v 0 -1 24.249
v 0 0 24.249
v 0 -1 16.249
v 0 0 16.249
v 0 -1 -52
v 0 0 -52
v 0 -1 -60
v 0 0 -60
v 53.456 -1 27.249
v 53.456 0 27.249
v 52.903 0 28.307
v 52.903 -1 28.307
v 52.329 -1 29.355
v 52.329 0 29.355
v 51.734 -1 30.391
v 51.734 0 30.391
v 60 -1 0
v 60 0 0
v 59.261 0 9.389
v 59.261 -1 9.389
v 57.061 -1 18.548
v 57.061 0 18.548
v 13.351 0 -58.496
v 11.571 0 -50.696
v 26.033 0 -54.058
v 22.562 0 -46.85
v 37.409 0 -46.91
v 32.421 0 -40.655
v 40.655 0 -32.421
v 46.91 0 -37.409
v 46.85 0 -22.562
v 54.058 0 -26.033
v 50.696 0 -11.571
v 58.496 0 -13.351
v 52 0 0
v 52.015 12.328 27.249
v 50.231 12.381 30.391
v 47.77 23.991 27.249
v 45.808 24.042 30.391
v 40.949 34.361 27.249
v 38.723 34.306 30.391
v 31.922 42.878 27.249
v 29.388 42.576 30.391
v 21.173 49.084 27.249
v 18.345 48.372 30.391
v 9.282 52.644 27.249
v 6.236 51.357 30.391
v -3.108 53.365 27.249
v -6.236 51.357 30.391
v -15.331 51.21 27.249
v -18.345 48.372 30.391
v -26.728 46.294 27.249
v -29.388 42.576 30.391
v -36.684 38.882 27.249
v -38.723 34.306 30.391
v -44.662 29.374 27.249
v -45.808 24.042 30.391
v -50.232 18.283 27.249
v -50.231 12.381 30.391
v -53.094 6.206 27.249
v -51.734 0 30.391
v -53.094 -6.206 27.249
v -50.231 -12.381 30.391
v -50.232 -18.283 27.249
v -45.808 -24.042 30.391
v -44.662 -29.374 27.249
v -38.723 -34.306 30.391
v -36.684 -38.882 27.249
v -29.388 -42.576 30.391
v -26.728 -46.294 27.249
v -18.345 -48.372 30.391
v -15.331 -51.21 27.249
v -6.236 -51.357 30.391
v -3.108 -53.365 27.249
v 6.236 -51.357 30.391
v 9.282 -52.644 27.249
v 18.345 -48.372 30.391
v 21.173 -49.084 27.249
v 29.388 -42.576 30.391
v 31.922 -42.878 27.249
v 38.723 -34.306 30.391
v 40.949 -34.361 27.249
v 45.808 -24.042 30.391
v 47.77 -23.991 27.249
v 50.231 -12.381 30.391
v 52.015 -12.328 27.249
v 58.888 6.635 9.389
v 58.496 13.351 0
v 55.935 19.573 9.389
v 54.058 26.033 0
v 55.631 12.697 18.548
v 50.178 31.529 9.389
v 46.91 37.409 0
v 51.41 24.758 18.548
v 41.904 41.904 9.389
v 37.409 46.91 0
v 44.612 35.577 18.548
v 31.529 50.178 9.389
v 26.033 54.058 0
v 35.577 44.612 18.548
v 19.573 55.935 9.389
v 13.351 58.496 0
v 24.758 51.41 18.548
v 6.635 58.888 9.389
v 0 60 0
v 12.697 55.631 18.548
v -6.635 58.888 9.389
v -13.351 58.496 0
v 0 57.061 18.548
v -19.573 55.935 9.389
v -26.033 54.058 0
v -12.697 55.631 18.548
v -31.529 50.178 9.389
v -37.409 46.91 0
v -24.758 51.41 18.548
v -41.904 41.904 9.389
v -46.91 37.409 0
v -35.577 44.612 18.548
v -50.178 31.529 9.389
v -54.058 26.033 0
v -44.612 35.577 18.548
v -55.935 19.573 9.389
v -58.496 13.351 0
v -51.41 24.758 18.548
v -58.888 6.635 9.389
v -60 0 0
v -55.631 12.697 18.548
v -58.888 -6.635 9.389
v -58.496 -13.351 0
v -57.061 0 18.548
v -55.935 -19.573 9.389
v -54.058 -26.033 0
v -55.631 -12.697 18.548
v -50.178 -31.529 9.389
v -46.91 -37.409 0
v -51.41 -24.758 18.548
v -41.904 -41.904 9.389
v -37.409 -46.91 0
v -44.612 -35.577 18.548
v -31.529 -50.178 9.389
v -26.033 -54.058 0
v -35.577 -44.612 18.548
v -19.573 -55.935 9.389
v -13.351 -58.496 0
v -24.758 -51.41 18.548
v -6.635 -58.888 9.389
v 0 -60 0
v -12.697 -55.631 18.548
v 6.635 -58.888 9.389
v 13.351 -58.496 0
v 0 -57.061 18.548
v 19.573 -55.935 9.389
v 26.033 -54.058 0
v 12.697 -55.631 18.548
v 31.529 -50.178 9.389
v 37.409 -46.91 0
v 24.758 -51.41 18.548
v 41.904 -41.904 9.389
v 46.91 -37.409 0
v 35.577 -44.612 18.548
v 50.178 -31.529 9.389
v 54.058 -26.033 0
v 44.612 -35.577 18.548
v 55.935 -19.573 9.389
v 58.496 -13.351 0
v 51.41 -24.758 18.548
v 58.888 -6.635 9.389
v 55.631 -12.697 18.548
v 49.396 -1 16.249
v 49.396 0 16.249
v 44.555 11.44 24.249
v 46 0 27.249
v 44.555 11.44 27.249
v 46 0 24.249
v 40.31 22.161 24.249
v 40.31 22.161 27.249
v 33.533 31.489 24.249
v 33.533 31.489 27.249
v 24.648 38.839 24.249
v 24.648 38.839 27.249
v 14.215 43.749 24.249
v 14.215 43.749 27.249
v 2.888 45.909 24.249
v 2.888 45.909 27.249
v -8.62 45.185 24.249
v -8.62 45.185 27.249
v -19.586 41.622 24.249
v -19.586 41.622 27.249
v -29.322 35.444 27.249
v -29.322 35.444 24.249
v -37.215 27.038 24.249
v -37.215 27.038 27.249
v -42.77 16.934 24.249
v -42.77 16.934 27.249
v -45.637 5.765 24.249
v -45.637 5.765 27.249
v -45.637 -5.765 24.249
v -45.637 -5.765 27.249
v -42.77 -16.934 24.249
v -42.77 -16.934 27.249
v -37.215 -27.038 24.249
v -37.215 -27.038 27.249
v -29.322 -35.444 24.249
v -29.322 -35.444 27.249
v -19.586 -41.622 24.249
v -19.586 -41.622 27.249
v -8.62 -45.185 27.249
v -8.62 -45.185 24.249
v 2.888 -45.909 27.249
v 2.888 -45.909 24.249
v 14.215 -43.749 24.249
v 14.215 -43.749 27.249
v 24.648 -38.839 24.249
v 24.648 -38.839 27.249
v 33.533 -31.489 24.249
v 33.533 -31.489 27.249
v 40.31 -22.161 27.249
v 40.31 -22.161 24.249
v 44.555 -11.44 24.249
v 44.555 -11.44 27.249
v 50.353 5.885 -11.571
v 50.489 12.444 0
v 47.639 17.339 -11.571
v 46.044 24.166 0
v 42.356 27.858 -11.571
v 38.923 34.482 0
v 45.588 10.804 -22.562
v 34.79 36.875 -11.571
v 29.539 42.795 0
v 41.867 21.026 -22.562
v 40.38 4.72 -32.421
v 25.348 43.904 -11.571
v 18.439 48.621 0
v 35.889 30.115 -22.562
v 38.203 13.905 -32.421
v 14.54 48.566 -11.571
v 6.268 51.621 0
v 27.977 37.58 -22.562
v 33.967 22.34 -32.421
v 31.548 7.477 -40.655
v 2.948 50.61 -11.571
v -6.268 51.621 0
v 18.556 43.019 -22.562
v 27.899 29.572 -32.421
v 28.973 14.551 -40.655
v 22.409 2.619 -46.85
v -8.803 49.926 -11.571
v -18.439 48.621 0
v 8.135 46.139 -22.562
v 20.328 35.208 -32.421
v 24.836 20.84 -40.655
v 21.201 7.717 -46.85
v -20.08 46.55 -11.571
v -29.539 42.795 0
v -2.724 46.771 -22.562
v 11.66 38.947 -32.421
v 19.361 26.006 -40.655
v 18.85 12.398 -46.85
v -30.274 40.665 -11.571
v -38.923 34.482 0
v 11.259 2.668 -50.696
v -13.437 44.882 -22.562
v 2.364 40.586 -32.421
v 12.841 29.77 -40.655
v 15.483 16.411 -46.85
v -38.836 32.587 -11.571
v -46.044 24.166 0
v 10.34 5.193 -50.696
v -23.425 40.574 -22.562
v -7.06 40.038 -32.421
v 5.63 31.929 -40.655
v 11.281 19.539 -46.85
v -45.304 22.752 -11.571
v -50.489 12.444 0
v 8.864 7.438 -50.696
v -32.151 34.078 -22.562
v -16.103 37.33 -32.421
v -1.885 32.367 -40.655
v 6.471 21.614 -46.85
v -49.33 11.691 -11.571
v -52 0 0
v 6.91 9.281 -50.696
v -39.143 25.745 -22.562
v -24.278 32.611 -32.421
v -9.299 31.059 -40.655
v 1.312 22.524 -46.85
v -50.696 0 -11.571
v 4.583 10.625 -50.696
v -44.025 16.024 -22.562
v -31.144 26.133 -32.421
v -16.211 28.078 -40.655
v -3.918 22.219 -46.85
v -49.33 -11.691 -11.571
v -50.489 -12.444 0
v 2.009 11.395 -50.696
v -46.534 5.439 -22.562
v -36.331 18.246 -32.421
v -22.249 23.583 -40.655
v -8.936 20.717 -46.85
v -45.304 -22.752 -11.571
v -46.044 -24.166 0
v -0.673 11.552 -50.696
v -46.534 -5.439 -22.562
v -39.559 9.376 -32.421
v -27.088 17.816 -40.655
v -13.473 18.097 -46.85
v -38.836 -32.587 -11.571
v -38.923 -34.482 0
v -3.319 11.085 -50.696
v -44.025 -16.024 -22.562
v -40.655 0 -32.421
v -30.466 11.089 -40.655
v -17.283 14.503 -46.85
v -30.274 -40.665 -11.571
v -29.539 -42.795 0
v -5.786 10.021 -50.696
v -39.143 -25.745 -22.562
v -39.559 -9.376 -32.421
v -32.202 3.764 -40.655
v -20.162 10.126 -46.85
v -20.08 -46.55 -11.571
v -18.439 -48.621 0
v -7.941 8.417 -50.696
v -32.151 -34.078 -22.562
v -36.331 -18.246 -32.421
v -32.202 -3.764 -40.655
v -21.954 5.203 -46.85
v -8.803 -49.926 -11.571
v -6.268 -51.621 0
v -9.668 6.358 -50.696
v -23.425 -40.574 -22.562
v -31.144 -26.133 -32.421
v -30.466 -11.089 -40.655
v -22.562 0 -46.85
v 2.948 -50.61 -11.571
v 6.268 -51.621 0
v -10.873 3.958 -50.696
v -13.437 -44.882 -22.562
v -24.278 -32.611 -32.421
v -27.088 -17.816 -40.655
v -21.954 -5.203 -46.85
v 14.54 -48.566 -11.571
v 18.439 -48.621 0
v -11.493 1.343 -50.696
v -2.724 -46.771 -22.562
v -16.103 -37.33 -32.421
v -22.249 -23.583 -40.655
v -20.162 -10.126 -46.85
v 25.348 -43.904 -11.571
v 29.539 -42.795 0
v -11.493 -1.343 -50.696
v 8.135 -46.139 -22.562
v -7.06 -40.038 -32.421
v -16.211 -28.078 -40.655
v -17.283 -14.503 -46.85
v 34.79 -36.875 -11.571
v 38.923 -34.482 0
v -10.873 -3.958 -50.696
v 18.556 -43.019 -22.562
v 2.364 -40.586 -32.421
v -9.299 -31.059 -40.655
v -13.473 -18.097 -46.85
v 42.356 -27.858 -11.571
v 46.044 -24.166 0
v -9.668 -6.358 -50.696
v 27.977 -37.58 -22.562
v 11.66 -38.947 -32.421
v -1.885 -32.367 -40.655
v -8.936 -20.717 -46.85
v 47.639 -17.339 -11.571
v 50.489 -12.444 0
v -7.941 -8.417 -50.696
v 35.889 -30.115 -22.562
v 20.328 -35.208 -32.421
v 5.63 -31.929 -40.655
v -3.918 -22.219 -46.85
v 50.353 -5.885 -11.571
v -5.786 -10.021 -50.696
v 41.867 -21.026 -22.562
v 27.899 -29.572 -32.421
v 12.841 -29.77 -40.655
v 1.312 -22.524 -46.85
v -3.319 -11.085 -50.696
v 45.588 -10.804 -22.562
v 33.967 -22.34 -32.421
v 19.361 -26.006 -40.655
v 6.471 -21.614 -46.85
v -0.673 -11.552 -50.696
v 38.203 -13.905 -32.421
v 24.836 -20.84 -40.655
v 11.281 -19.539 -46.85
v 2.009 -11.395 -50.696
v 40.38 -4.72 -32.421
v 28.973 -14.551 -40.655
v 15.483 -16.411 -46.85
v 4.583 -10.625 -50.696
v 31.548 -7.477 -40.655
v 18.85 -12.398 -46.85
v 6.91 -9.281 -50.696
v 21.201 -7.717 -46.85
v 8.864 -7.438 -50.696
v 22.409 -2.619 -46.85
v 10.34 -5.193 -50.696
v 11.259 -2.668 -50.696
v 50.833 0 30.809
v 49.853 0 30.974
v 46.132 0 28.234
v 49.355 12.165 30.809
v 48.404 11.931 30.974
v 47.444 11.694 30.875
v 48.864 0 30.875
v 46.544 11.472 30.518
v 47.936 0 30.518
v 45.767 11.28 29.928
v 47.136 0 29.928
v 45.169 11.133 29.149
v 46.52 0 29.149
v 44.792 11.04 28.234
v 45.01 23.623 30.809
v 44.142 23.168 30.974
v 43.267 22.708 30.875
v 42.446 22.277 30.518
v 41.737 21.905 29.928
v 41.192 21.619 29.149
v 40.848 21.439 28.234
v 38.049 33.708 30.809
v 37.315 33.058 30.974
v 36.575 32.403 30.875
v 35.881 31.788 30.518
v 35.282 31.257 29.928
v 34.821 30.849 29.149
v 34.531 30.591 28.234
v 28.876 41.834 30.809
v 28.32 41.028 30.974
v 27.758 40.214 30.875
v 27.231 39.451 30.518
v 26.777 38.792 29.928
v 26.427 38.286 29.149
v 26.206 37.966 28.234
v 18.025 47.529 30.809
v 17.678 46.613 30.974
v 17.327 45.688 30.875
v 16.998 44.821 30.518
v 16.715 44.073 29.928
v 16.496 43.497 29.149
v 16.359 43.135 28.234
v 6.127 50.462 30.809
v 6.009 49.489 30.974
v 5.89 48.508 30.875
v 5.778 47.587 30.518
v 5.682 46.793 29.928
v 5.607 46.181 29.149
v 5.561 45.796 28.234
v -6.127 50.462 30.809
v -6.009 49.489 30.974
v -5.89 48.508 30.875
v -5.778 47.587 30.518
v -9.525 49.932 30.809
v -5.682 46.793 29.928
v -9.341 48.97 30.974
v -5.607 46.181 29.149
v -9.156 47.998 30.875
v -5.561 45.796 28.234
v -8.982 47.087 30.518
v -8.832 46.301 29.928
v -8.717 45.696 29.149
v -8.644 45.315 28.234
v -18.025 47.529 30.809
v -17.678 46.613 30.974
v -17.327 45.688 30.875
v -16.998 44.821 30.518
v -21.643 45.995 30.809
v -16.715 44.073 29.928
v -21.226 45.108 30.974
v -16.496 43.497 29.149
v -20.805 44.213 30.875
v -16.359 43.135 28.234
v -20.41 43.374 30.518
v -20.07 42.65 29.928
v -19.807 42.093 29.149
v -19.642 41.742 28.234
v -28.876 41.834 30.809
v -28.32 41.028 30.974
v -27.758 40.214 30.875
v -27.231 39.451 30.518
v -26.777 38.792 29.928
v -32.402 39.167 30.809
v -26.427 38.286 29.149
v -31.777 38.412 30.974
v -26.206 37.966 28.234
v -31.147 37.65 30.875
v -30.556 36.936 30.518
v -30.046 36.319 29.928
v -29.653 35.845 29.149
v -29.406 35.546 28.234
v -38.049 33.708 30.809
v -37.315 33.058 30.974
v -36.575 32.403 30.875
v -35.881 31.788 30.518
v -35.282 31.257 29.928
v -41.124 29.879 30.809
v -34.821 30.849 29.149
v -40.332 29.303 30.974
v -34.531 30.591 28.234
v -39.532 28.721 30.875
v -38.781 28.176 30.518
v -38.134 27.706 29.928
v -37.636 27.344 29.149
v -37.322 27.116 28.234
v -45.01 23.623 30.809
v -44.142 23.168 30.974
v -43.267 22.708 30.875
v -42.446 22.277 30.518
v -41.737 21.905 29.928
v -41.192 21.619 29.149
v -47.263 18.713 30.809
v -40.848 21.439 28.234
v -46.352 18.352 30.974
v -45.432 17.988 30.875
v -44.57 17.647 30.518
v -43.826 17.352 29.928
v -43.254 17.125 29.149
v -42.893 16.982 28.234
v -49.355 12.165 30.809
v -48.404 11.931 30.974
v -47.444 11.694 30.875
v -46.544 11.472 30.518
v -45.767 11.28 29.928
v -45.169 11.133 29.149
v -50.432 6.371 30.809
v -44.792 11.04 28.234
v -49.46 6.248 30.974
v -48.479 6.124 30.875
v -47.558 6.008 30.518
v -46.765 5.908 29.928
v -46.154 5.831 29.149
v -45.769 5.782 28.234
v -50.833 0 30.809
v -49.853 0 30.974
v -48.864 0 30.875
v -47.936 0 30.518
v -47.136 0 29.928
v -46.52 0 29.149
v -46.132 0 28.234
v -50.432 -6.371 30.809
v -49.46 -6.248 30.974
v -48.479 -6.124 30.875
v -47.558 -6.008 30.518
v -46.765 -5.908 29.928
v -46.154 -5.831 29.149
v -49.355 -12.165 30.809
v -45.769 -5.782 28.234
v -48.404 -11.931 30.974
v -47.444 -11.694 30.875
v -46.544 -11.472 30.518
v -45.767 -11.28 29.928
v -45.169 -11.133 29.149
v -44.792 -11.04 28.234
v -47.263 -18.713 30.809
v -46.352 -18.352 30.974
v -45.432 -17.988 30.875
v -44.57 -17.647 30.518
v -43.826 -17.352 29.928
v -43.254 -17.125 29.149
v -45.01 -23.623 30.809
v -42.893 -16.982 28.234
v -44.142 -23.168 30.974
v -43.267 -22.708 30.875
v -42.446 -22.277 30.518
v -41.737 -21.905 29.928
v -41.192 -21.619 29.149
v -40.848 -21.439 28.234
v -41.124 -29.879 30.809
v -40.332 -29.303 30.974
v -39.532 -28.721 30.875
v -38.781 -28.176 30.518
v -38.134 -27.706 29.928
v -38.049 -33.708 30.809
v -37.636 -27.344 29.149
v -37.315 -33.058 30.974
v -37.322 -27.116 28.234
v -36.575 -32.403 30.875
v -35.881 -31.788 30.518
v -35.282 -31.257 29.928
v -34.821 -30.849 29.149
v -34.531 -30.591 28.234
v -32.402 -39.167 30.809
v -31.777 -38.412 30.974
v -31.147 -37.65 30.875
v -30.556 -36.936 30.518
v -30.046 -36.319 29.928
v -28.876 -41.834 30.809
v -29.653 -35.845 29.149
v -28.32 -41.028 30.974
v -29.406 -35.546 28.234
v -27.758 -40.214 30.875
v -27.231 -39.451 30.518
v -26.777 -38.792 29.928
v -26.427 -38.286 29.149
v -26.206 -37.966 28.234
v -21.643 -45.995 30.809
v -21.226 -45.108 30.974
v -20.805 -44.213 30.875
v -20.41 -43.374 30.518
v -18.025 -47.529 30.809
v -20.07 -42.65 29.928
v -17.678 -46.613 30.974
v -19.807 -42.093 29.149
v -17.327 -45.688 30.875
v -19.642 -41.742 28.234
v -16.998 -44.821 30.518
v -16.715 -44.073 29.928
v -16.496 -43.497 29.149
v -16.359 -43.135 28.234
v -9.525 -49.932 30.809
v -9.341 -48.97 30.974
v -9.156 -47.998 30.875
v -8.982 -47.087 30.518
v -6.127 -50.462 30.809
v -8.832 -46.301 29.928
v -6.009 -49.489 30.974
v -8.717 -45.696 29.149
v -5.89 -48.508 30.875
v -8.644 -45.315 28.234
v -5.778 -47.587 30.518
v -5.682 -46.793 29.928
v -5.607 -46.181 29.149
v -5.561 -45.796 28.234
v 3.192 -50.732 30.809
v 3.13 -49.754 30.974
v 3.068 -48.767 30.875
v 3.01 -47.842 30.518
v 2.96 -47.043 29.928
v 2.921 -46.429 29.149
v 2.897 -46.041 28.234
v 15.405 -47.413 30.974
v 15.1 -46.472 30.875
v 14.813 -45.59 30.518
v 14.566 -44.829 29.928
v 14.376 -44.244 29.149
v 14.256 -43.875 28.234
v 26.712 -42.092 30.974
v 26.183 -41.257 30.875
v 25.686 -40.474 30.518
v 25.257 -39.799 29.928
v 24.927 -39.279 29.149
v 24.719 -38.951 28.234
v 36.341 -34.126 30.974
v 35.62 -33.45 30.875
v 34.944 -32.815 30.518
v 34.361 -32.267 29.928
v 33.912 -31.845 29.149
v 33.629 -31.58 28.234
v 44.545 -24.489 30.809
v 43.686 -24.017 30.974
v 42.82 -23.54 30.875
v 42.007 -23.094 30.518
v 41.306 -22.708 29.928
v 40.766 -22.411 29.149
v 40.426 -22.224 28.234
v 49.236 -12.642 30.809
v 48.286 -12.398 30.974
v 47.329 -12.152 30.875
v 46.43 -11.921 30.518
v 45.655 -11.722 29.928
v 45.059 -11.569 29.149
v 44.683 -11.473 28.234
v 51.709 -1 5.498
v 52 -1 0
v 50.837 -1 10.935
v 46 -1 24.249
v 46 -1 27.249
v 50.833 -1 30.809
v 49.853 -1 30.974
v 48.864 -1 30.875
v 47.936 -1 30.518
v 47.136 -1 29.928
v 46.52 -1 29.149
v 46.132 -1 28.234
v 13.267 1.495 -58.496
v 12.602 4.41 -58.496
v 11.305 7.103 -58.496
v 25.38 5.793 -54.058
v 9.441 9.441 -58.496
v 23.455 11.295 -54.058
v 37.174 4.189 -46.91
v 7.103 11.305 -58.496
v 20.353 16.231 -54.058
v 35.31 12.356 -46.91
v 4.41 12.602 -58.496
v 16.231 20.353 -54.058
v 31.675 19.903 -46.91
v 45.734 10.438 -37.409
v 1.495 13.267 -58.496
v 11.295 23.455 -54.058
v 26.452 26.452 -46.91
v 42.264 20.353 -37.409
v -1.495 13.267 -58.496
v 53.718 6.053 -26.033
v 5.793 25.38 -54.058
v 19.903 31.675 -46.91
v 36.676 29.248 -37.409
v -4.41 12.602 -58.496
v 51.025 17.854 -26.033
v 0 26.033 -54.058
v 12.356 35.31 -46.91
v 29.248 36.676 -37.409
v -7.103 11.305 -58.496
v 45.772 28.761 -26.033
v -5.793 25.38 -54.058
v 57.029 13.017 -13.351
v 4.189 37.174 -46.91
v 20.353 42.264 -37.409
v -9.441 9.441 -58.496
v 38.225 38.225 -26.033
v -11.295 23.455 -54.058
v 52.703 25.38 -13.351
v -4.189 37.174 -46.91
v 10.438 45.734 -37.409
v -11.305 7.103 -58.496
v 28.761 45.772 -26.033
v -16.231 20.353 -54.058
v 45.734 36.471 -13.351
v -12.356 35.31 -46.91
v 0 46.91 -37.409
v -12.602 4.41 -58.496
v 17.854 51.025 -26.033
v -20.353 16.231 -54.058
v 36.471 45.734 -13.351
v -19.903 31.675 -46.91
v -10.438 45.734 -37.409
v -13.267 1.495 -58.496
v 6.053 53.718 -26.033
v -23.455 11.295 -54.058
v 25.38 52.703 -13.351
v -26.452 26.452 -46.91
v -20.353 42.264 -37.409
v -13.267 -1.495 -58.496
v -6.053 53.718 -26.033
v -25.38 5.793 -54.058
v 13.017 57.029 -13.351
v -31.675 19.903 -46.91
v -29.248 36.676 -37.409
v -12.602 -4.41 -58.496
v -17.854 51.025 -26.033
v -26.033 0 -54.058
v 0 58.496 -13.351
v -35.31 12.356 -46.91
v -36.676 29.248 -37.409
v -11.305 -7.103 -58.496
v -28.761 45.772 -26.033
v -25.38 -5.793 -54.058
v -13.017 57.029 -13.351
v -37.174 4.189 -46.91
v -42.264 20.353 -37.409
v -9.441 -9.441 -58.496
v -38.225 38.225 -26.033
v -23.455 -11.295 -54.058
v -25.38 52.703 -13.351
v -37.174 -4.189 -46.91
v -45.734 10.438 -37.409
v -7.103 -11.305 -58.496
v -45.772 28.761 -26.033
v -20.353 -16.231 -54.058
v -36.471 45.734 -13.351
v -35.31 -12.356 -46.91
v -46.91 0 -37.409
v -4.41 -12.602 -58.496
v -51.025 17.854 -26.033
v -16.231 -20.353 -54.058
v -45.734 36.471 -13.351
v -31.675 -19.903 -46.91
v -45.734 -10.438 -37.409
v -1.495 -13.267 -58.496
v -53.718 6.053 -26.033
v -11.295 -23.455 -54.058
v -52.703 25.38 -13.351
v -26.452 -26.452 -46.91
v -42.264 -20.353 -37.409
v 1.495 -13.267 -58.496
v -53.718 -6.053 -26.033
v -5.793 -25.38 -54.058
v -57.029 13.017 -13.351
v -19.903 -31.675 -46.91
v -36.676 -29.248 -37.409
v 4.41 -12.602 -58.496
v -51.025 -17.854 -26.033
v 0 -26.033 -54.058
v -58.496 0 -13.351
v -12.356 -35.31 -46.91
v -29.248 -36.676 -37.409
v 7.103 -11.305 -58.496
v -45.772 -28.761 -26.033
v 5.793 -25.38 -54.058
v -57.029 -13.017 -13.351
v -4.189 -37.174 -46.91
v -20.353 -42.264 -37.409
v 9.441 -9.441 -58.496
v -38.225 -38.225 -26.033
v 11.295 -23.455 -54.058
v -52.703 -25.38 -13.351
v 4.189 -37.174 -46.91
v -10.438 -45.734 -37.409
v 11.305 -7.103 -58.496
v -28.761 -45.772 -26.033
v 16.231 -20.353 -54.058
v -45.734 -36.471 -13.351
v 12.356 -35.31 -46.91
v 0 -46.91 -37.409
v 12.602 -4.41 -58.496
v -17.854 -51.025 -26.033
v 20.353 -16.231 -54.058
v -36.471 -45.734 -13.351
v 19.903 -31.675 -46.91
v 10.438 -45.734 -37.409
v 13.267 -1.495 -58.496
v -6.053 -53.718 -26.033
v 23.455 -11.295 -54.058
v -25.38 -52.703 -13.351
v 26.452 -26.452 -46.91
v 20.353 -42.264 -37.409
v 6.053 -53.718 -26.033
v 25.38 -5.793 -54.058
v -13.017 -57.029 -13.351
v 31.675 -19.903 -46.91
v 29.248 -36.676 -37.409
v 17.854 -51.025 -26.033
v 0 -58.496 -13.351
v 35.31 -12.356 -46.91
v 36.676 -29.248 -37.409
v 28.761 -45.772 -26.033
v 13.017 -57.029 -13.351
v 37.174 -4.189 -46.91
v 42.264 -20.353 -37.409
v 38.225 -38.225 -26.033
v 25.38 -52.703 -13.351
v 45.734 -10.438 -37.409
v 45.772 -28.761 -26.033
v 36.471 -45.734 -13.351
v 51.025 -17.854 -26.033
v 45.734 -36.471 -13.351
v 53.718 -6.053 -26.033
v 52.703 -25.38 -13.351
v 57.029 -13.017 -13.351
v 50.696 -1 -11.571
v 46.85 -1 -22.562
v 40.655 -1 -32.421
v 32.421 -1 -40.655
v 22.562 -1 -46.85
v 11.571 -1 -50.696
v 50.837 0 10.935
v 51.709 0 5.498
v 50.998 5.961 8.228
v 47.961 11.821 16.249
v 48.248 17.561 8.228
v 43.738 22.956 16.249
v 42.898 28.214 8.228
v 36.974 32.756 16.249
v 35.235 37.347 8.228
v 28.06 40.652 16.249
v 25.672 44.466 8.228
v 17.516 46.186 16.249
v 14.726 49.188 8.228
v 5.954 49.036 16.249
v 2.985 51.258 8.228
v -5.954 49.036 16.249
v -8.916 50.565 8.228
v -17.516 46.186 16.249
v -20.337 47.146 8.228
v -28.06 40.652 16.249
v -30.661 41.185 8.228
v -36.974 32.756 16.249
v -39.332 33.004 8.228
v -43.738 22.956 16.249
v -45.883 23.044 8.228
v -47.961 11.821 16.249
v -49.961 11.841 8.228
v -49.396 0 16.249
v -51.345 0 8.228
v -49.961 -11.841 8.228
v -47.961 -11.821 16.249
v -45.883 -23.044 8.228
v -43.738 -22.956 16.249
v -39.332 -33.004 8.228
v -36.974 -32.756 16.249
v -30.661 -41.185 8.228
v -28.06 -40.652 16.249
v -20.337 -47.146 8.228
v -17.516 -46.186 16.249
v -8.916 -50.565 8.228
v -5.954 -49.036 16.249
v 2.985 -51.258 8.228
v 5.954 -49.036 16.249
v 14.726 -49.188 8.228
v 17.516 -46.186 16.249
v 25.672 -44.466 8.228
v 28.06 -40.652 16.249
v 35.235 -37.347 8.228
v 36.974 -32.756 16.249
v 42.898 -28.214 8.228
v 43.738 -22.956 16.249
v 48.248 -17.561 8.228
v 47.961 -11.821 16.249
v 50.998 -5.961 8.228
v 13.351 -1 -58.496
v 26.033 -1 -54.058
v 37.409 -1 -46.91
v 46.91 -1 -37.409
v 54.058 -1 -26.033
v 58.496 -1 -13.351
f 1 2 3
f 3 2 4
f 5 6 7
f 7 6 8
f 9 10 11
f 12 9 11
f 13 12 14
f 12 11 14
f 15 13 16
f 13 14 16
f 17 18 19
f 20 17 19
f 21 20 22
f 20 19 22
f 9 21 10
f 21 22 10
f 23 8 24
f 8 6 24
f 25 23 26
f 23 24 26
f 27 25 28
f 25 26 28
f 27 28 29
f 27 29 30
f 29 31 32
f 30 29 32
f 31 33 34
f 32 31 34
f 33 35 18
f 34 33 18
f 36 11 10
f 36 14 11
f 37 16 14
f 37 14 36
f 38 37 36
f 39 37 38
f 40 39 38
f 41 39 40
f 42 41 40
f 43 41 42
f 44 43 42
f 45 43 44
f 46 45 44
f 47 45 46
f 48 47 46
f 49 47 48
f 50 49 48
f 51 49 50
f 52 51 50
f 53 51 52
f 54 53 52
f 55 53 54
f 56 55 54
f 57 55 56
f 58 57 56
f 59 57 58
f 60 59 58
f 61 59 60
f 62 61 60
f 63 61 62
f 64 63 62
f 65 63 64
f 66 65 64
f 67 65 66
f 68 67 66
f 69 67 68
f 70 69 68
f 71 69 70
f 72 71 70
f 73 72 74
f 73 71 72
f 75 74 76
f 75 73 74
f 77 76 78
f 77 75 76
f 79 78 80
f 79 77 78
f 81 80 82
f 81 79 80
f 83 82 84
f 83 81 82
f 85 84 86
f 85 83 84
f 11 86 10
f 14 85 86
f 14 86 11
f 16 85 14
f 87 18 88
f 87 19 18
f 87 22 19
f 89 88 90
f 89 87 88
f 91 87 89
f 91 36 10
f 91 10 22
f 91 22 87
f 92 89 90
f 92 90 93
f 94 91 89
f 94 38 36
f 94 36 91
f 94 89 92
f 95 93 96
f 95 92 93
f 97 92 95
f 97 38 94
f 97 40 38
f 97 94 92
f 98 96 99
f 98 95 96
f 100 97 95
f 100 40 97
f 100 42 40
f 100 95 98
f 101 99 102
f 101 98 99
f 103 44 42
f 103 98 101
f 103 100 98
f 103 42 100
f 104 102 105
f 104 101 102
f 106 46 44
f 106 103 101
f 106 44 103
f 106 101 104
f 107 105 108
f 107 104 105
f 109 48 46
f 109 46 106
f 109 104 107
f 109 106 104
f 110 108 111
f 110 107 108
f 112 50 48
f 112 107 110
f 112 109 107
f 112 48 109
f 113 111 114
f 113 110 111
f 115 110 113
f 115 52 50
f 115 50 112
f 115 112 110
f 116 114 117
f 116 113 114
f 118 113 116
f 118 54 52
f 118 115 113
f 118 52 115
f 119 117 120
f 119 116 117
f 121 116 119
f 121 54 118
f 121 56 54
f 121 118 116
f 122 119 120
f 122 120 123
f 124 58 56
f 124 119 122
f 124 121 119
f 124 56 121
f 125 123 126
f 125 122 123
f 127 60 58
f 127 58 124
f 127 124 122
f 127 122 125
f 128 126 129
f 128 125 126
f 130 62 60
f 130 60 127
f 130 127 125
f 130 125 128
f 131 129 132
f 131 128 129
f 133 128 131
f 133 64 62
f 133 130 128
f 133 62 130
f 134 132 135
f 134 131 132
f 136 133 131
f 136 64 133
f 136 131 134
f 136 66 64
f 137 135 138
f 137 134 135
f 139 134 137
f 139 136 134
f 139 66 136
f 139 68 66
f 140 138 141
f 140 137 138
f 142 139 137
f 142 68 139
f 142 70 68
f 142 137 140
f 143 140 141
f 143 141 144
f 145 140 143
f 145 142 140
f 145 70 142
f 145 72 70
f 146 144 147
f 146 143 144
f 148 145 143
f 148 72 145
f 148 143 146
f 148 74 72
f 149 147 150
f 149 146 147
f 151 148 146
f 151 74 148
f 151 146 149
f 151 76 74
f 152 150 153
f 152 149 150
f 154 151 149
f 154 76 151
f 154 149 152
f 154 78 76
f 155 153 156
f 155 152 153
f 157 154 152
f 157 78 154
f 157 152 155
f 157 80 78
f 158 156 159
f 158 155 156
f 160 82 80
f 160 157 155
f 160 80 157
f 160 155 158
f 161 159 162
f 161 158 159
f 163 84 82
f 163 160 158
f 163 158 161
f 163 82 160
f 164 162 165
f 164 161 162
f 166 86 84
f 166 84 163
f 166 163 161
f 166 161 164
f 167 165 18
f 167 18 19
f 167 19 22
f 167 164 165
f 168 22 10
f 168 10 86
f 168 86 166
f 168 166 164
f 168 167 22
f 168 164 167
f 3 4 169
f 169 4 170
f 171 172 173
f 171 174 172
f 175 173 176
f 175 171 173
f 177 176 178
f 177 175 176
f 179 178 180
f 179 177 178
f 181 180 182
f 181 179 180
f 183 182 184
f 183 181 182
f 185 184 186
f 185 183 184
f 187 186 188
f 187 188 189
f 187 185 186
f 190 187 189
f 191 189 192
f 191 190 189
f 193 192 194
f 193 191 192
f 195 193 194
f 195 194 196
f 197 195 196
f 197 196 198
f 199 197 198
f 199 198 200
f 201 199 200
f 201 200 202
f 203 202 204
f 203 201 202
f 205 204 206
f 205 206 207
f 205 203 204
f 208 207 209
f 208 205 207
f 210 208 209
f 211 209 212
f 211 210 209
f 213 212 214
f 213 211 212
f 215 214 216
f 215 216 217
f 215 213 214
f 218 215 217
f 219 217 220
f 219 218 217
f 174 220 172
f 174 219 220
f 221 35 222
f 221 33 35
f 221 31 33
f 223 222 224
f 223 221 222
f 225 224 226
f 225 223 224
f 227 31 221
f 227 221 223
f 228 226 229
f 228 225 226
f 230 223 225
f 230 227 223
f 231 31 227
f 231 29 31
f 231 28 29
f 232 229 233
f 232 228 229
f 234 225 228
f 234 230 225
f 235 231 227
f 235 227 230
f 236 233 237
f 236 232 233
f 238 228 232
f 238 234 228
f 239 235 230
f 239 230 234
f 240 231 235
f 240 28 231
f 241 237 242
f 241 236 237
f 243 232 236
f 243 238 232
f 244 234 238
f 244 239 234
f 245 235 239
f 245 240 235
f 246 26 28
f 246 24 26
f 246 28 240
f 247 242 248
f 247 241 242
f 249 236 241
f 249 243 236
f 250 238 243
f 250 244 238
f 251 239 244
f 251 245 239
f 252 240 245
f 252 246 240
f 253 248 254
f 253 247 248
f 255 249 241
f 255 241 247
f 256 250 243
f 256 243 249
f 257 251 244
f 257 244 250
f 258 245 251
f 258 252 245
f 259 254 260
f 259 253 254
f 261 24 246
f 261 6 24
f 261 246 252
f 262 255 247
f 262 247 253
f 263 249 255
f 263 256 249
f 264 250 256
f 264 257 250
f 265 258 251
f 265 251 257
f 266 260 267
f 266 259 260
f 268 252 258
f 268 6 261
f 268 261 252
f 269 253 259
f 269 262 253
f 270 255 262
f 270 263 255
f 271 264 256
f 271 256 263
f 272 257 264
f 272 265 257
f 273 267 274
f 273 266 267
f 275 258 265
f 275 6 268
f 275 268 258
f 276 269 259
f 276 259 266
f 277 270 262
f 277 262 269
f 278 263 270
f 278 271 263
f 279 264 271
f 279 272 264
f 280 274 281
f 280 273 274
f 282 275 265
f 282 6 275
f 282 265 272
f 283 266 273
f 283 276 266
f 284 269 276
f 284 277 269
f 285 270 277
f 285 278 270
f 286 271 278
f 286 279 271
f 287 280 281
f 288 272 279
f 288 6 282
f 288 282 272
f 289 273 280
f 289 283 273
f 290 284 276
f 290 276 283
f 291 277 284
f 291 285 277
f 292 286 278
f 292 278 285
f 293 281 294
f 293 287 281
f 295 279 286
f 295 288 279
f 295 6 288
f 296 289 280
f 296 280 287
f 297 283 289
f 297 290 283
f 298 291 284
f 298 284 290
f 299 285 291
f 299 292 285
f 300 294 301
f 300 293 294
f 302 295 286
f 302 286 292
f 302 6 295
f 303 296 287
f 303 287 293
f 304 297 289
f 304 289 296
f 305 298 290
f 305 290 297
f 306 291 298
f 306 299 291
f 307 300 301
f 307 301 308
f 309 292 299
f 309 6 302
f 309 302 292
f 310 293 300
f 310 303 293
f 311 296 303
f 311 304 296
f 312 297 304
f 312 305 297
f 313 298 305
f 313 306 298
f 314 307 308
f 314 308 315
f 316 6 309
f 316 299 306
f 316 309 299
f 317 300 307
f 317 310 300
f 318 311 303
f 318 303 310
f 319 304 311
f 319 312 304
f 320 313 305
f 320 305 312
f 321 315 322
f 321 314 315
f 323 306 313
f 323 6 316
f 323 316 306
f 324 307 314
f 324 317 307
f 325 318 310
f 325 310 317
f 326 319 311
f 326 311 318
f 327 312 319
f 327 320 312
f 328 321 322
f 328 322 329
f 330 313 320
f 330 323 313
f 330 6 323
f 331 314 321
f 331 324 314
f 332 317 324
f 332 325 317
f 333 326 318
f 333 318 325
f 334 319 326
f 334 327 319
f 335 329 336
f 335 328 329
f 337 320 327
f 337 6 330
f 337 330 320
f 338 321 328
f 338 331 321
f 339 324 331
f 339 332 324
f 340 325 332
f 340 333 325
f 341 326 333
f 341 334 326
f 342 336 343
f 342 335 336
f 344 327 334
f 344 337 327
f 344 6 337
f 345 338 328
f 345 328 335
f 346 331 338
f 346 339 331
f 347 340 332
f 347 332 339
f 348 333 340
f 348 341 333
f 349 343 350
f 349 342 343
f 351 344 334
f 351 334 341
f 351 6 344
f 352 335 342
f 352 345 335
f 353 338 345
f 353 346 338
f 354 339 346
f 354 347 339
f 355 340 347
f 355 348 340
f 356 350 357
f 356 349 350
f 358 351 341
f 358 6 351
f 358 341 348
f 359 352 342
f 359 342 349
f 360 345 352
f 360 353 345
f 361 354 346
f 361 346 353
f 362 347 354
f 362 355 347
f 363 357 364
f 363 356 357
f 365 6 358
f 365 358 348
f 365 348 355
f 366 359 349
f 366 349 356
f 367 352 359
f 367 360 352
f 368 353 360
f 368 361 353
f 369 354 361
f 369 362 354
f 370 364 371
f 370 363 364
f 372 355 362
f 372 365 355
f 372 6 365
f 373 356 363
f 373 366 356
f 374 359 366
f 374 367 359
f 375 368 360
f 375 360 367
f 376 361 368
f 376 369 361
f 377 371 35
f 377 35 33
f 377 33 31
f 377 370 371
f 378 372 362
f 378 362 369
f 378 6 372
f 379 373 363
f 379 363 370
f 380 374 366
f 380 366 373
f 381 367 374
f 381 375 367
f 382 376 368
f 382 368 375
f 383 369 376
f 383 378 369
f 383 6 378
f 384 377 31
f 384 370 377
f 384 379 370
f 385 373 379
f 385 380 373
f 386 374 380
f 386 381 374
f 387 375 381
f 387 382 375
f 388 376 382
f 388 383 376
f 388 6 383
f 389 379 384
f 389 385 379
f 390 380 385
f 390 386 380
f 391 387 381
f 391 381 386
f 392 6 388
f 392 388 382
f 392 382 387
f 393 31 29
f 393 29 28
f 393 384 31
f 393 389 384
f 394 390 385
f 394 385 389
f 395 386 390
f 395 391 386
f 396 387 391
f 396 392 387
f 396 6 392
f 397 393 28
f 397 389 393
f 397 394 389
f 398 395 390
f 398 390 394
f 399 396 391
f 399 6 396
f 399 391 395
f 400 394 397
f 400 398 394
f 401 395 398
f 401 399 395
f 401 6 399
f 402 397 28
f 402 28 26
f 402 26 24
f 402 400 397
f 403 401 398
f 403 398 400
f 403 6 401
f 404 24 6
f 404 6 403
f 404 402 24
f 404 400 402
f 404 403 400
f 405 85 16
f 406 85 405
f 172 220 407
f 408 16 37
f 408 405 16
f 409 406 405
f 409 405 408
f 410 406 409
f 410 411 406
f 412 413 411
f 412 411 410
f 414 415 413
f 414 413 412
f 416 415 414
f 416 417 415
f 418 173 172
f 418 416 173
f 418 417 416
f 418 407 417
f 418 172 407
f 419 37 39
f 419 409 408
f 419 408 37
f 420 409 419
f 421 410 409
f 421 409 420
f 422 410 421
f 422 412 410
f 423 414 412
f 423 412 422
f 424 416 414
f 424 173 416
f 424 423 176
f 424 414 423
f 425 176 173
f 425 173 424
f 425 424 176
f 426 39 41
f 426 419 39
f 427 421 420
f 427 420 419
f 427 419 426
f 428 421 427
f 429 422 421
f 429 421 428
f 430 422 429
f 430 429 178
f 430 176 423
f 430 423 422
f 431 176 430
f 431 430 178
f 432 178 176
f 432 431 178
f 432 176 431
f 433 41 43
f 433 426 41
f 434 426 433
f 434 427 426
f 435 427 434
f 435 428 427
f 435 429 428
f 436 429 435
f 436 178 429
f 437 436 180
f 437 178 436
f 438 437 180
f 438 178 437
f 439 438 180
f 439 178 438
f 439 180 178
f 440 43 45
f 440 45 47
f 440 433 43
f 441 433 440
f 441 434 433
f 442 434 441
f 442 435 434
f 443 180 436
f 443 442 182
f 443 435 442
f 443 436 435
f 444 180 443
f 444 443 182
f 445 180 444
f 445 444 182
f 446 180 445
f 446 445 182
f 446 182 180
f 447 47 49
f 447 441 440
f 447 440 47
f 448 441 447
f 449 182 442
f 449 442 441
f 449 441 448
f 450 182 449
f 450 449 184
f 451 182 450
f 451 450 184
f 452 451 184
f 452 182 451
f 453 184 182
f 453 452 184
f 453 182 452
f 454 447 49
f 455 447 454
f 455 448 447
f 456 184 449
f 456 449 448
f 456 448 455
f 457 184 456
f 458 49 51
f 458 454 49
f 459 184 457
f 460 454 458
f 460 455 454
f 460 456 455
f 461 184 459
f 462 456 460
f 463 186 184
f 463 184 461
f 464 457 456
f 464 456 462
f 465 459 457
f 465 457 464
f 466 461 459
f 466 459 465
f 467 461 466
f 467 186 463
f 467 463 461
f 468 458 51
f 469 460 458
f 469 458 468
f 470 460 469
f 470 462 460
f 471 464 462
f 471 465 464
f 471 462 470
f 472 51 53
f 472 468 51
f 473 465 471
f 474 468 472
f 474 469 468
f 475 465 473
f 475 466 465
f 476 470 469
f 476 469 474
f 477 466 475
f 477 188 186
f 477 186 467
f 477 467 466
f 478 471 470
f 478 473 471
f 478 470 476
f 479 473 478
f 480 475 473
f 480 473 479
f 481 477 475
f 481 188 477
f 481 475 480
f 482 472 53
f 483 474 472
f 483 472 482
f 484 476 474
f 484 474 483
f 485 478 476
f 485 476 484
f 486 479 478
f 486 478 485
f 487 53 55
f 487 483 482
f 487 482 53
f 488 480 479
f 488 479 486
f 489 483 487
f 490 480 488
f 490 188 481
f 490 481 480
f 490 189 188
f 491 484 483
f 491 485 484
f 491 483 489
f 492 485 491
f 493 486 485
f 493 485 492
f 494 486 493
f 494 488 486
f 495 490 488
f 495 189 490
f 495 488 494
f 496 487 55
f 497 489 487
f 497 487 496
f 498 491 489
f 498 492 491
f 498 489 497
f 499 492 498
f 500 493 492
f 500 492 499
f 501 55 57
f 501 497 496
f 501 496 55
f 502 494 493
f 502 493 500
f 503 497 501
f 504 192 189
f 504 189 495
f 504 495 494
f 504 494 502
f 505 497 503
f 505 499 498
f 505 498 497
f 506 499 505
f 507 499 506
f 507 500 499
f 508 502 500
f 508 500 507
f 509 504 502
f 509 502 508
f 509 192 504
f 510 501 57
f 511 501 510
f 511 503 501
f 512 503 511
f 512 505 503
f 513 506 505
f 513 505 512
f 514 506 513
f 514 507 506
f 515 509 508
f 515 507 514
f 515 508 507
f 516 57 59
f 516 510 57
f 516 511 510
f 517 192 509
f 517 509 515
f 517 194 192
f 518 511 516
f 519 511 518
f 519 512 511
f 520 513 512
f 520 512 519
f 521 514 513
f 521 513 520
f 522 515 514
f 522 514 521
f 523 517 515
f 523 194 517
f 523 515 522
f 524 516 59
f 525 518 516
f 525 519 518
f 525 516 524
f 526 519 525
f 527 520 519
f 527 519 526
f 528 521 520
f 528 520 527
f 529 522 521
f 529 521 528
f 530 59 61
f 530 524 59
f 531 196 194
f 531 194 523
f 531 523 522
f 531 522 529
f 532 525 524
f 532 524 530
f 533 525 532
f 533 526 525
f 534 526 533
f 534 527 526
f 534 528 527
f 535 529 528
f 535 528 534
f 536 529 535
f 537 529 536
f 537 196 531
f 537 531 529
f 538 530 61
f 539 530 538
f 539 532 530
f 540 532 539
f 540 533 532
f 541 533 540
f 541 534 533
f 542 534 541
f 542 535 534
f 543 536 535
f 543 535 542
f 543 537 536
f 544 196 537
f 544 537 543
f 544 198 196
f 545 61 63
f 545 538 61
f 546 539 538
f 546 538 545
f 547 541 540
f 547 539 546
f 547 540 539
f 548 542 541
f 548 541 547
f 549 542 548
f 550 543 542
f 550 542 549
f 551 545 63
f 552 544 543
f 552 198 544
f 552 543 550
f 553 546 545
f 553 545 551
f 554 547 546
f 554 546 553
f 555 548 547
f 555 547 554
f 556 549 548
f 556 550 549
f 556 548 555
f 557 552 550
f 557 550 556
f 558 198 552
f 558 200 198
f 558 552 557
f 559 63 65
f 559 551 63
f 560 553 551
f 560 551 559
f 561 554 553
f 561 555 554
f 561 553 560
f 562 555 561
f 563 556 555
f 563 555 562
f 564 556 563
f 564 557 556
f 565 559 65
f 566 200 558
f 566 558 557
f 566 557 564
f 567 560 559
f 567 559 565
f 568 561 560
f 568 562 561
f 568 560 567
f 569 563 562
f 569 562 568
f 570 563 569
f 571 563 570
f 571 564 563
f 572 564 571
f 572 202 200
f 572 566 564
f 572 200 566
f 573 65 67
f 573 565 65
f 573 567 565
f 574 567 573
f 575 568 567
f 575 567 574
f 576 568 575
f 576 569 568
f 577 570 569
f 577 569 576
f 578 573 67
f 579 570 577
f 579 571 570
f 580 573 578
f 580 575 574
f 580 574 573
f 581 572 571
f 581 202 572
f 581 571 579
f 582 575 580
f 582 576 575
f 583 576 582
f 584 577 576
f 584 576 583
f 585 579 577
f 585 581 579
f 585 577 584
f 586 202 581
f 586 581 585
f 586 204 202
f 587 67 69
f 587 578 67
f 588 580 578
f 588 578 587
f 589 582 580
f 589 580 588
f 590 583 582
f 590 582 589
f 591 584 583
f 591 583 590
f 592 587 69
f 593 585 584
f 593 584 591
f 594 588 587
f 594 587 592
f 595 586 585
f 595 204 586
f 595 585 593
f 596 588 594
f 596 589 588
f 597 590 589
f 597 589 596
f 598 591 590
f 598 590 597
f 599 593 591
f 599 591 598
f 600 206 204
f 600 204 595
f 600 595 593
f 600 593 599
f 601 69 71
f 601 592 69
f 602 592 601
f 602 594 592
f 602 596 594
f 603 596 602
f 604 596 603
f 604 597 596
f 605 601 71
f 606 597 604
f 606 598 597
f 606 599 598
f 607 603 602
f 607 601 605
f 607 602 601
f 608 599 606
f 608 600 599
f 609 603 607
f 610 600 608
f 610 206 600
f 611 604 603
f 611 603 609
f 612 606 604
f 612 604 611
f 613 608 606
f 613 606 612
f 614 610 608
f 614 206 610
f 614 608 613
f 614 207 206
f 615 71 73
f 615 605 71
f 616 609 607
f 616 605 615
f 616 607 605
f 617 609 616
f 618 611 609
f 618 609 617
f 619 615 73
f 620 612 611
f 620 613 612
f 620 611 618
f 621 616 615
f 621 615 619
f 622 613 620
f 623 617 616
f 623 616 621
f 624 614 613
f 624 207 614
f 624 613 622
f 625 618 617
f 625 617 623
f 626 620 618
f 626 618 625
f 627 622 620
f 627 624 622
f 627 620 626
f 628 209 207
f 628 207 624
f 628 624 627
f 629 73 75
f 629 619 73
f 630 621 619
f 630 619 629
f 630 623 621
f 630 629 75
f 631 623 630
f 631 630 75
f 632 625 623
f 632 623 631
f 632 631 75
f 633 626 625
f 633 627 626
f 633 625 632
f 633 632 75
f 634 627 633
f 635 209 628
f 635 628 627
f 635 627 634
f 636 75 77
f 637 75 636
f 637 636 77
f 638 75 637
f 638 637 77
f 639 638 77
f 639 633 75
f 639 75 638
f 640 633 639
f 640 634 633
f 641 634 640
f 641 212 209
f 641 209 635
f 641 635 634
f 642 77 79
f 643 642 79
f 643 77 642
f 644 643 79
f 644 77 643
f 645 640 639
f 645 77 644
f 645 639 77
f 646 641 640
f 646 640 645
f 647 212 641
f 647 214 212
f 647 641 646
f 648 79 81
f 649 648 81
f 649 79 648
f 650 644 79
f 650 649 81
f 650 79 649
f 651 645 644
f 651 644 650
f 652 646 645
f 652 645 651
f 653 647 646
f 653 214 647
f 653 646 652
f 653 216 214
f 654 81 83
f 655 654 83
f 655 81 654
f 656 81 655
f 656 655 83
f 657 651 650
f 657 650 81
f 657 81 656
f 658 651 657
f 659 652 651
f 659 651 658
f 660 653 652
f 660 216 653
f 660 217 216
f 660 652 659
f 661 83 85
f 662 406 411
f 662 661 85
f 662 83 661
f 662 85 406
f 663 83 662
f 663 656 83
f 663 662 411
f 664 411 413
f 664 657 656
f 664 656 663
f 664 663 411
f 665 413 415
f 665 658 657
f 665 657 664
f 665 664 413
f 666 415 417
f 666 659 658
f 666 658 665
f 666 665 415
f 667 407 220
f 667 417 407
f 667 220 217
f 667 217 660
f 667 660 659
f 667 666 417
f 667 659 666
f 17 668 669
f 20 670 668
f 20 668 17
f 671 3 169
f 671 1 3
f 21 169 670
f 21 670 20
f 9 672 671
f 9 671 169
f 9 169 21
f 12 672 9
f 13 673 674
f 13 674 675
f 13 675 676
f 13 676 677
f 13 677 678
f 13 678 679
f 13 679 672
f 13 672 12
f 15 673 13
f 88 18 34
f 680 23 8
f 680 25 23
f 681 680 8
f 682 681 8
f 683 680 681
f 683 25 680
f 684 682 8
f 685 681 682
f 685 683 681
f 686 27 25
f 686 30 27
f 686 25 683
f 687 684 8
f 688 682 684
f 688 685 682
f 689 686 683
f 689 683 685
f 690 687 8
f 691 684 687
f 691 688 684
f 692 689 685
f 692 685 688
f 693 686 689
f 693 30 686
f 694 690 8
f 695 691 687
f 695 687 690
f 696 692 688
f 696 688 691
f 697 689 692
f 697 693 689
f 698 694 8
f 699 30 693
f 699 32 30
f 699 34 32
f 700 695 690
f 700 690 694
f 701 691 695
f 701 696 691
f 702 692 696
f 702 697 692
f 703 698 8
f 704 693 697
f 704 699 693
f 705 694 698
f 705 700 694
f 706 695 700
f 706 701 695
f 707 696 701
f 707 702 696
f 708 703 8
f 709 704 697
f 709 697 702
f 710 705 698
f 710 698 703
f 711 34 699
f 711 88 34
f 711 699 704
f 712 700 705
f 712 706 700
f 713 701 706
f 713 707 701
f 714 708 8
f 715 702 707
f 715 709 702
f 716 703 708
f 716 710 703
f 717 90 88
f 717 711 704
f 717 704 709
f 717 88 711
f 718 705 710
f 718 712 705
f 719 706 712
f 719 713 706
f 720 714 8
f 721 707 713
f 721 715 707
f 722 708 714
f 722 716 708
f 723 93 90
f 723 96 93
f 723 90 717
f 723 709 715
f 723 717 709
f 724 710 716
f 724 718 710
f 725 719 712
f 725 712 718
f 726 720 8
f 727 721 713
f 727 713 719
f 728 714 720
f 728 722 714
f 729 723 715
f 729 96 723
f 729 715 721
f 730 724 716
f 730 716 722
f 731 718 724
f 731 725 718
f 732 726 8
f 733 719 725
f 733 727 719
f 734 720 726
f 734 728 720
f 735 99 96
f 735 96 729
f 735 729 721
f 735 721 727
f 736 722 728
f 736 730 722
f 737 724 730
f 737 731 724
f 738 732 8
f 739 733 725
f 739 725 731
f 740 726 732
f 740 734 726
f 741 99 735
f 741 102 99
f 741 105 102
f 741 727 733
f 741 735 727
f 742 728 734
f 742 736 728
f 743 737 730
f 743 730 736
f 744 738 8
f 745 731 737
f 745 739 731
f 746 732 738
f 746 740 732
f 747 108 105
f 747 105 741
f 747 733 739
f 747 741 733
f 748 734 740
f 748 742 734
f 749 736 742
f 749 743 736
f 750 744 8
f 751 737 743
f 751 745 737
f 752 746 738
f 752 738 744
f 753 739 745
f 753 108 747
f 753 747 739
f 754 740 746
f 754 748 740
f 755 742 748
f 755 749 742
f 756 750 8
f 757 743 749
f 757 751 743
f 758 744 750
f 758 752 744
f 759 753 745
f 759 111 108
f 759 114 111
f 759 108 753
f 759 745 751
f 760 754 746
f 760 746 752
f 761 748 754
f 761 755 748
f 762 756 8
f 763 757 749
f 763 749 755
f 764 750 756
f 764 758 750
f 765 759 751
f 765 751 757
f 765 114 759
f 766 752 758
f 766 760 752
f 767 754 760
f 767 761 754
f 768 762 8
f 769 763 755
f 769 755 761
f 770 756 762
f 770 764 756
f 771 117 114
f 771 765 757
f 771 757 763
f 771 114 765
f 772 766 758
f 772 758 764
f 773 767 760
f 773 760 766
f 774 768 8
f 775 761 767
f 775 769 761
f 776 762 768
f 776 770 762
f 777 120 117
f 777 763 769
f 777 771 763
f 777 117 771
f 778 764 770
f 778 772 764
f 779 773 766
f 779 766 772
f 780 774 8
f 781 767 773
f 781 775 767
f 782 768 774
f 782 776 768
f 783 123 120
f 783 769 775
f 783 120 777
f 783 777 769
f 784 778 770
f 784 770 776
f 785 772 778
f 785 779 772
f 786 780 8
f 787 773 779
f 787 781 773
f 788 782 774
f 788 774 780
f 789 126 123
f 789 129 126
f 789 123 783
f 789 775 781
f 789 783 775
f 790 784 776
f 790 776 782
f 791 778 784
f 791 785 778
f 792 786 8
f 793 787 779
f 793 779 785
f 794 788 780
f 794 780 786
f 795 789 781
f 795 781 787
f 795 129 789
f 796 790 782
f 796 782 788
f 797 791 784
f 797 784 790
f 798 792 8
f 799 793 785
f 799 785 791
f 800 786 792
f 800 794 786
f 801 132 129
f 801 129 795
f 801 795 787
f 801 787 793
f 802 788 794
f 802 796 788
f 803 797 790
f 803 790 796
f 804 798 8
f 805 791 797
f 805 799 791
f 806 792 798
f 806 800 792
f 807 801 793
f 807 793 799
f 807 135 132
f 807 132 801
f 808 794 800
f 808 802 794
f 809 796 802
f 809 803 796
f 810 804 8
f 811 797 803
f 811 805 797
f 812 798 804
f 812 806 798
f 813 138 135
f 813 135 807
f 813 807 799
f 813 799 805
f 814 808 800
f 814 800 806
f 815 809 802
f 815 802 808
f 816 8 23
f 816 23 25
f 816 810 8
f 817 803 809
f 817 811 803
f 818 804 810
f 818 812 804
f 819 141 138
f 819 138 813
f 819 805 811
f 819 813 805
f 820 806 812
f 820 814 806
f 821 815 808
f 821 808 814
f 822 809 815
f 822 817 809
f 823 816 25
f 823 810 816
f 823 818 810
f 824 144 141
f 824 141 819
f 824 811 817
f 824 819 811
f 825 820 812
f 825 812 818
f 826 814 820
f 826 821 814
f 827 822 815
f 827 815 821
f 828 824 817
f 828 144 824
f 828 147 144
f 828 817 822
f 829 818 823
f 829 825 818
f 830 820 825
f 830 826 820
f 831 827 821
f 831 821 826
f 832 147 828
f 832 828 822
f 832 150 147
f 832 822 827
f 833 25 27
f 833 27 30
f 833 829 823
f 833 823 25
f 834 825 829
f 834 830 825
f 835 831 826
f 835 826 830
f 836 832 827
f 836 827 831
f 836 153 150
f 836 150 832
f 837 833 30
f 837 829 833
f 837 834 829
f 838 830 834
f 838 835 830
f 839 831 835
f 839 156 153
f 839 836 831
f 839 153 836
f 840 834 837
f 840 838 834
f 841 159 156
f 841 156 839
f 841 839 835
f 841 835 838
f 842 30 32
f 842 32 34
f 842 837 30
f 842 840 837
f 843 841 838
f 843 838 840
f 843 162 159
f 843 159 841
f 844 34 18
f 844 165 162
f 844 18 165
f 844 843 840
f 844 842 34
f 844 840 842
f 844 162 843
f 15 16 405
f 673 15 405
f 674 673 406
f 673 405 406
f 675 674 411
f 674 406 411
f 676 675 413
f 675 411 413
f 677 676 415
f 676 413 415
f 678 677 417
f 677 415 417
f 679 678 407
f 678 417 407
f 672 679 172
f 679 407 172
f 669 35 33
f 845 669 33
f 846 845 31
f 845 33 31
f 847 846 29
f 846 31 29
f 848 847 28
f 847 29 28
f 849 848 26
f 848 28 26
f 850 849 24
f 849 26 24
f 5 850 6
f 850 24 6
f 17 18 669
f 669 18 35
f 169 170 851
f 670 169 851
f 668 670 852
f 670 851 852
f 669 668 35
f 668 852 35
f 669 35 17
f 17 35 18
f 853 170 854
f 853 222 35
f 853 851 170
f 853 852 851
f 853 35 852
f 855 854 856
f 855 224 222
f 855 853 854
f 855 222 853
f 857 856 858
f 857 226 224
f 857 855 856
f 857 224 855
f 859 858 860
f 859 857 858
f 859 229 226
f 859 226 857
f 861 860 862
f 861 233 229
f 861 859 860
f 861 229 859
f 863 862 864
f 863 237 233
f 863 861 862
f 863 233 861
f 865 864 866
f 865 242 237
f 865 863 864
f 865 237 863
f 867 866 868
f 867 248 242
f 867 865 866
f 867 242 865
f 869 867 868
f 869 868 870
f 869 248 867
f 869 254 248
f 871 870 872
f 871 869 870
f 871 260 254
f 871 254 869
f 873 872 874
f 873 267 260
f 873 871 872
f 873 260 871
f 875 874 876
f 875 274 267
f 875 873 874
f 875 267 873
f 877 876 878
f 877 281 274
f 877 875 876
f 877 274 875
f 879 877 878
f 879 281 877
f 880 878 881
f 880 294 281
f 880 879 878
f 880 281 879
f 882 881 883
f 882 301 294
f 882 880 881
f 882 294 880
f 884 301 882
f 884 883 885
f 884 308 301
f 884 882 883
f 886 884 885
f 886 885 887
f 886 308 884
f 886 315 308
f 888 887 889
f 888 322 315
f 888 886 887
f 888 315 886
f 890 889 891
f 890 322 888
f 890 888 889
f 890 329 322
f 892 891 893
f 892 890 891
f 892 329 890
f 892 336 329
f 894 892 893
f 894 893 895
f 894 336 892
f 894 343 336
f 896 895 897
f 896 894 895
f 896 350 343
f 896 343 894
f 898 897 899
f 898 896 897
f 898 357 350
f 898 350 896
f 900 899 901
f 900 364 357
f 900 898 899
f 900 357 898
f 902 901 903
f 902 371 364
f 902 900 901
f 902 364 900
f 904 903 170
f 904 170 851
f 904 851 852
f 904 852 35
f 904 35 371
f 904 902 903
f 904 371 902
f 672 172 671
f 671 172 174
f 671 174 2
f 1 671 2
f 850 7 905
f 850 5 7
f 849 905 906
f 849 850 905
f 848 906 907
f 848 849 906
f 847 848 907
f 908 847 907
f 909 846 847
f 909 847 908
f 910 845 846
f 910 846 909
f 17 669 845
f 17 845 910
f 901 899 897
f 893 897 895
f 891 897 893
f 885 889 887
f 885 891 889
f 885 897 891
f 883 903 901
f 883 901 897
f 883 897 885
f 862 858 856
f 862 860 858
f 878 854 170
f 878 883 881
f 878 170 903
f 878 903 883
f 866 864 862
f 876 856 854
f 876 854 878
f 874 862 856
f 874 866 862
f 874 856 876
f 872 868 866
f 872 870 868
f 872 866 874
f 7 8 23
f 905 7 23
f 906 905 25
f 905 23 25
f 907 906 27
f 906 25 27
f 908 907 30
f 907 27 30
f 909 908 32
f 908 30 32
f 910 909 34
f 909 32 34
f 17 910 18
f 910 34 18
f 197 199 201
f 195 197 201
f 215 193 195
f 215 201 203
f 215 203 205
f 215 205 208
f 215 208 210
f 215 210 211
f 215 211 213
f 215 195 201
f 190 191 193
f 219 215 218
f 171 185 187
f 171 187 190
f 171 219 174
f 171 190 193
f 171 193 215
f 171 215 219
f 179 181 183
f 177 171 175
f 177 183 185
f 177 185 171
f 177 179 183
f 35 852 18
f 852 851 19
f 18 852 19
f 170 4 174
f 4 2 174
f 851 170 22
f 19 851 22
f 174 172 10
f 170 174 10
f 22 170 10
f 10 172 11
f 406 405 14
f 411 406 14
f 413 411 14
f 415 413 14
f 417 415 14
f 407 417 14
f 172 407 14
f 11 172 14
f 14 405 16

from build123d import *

# Parameters (mm, degrees)
F3_DEPTH = 1
F4_DEPTH = 1


# Not quite as in the source:
# - a feature names something its author has since deleted; it is built from what else it names


with BuildPart() as f2:
    # F0 (on Front) → F2 (revolve)
    with BuildSketch(Plane.XZ):
        with BuildLine():
            Line((0, 16.248711306), (49.3961474297, 16.248711306))
            ThreePointArc((49.3961474297, 16.248711306), (47.8655015236, 20.3197874963), (46, 24.248711306))
            Line((46, 24.248711306), (0, 24.248711306))
            Line((0, 24.248711306), (0, 16.248711306))
        make_face()
        with BuildLine():
            ThreePointArc((0, -60), (42.4264068712, -42.4264068712), (60, 0))
            Line((60, 0), (52, 0))
            ThreePointArc((52, 0), (36.7695526217, -36.7695526217), (0, -52))
            Line((0, -52), (0, -60))
        make_face()
        with BuildLine():
            Line((52, 0), (60, 0))
            ThreePointArc((60, 0), (58.3409790885, 14.0117864313), (53.4556613668, 27.248711306))
            Line((53.4556613668, 27.248711306), (46, 27.248711306))
            Line((46, 27.248711306), (46, 24.248711306))
            ThreePointArc((46, 24.248711306), (47.8655015236, 20.3197874963), (49.3961474297, 16.248711306))
            ThreePointArc((49.3961474297, 16.248711306), (51.3449104895, 8.2280111101), (52, 0))
        make_face()
        with BuildLine():
            Line((46, 27.248711306), (53.4556613668, 27.248711306))
            ThreePointArc((53.4556613668, 27.248711306), (52.6182835721, 28.8325551058), (51.7339912755, 30.3906917774))
            ThreePointArc((51.7339912755, 30.3906917774), (47.93644929, 30.5179121728), (46, 27.248711306))
        make_face()
    revolve(axis=Axis((0, 0, 0), (0, 0, 1)))


with BuildPart() as f3:
    # F0 (on Front) → F3 (new body)
    with BuildSketch(Plane.XZ):
        with BuildLine():
            Line((0, 16.248711306), (49.3961474297, 16.248711306))
            ThreePointArc((49.3961474297, 16.248711306), (47.8655015236, 20.3197874963), (46, 24.248711306))
            Line((46, 24.248711306), (0, 24.248711306))
            Line((0, 24.248711306), (0, 16.248711306))
        make_face()
        with BuildLine():
            Line((46, 27.248711306), (53.4556613668, 27.248711306))
            ThreePointArc((53.4556613668, 27.248711306), (52.6182835721, 28.8325551058), (51.7339912755, 30.3906917774))
            ThreePointArc((51.7339912755, 30.3906917774), (47.93644929, 30.5179121728), (46, 27.248711306))
        make_face()
        with BuildLine():
            Line((52, 0), (60, 0))
            ThreePointArc((60, 0), (58.3409790885, 14.0117864313), (53.4556613668, 27.248711306))
            Line((53.4556613668, 27.248711306), (46, 27.248711306))
            Line((46, 27.248711306), (46, 24.248711306))
            ThreePointArc((46, 24.248711306), (47.8655015236, 20.3197874963), (49.3961474297, 16.248711306))
            ThreePointArc((49.3961474297, 16.248711306), (51.3449104895, 8.2280111101), (52, 0))
        make_face()
    extrude(amount=F3_DEPTH)


with BuildPart() as f4:
    # F0 (on Front) → F4 (new body)
    with BuildSketch(Plane.XZ):
        with BuildLine():
            ThreePointArc((0, -60), (42.4264068712, -42.4264068712), (60, 0))
            Line((60, 0), (52, 0))
            ThreePointArc((52, 0), (36.7695526217, -36.7695526217), (0, -52))
            Line((0, -52), (0, -60))
        make_face()
    extrude(amount=F4_DEPTH)


solid = Compound([f2.part, f3.part, f4.part])
